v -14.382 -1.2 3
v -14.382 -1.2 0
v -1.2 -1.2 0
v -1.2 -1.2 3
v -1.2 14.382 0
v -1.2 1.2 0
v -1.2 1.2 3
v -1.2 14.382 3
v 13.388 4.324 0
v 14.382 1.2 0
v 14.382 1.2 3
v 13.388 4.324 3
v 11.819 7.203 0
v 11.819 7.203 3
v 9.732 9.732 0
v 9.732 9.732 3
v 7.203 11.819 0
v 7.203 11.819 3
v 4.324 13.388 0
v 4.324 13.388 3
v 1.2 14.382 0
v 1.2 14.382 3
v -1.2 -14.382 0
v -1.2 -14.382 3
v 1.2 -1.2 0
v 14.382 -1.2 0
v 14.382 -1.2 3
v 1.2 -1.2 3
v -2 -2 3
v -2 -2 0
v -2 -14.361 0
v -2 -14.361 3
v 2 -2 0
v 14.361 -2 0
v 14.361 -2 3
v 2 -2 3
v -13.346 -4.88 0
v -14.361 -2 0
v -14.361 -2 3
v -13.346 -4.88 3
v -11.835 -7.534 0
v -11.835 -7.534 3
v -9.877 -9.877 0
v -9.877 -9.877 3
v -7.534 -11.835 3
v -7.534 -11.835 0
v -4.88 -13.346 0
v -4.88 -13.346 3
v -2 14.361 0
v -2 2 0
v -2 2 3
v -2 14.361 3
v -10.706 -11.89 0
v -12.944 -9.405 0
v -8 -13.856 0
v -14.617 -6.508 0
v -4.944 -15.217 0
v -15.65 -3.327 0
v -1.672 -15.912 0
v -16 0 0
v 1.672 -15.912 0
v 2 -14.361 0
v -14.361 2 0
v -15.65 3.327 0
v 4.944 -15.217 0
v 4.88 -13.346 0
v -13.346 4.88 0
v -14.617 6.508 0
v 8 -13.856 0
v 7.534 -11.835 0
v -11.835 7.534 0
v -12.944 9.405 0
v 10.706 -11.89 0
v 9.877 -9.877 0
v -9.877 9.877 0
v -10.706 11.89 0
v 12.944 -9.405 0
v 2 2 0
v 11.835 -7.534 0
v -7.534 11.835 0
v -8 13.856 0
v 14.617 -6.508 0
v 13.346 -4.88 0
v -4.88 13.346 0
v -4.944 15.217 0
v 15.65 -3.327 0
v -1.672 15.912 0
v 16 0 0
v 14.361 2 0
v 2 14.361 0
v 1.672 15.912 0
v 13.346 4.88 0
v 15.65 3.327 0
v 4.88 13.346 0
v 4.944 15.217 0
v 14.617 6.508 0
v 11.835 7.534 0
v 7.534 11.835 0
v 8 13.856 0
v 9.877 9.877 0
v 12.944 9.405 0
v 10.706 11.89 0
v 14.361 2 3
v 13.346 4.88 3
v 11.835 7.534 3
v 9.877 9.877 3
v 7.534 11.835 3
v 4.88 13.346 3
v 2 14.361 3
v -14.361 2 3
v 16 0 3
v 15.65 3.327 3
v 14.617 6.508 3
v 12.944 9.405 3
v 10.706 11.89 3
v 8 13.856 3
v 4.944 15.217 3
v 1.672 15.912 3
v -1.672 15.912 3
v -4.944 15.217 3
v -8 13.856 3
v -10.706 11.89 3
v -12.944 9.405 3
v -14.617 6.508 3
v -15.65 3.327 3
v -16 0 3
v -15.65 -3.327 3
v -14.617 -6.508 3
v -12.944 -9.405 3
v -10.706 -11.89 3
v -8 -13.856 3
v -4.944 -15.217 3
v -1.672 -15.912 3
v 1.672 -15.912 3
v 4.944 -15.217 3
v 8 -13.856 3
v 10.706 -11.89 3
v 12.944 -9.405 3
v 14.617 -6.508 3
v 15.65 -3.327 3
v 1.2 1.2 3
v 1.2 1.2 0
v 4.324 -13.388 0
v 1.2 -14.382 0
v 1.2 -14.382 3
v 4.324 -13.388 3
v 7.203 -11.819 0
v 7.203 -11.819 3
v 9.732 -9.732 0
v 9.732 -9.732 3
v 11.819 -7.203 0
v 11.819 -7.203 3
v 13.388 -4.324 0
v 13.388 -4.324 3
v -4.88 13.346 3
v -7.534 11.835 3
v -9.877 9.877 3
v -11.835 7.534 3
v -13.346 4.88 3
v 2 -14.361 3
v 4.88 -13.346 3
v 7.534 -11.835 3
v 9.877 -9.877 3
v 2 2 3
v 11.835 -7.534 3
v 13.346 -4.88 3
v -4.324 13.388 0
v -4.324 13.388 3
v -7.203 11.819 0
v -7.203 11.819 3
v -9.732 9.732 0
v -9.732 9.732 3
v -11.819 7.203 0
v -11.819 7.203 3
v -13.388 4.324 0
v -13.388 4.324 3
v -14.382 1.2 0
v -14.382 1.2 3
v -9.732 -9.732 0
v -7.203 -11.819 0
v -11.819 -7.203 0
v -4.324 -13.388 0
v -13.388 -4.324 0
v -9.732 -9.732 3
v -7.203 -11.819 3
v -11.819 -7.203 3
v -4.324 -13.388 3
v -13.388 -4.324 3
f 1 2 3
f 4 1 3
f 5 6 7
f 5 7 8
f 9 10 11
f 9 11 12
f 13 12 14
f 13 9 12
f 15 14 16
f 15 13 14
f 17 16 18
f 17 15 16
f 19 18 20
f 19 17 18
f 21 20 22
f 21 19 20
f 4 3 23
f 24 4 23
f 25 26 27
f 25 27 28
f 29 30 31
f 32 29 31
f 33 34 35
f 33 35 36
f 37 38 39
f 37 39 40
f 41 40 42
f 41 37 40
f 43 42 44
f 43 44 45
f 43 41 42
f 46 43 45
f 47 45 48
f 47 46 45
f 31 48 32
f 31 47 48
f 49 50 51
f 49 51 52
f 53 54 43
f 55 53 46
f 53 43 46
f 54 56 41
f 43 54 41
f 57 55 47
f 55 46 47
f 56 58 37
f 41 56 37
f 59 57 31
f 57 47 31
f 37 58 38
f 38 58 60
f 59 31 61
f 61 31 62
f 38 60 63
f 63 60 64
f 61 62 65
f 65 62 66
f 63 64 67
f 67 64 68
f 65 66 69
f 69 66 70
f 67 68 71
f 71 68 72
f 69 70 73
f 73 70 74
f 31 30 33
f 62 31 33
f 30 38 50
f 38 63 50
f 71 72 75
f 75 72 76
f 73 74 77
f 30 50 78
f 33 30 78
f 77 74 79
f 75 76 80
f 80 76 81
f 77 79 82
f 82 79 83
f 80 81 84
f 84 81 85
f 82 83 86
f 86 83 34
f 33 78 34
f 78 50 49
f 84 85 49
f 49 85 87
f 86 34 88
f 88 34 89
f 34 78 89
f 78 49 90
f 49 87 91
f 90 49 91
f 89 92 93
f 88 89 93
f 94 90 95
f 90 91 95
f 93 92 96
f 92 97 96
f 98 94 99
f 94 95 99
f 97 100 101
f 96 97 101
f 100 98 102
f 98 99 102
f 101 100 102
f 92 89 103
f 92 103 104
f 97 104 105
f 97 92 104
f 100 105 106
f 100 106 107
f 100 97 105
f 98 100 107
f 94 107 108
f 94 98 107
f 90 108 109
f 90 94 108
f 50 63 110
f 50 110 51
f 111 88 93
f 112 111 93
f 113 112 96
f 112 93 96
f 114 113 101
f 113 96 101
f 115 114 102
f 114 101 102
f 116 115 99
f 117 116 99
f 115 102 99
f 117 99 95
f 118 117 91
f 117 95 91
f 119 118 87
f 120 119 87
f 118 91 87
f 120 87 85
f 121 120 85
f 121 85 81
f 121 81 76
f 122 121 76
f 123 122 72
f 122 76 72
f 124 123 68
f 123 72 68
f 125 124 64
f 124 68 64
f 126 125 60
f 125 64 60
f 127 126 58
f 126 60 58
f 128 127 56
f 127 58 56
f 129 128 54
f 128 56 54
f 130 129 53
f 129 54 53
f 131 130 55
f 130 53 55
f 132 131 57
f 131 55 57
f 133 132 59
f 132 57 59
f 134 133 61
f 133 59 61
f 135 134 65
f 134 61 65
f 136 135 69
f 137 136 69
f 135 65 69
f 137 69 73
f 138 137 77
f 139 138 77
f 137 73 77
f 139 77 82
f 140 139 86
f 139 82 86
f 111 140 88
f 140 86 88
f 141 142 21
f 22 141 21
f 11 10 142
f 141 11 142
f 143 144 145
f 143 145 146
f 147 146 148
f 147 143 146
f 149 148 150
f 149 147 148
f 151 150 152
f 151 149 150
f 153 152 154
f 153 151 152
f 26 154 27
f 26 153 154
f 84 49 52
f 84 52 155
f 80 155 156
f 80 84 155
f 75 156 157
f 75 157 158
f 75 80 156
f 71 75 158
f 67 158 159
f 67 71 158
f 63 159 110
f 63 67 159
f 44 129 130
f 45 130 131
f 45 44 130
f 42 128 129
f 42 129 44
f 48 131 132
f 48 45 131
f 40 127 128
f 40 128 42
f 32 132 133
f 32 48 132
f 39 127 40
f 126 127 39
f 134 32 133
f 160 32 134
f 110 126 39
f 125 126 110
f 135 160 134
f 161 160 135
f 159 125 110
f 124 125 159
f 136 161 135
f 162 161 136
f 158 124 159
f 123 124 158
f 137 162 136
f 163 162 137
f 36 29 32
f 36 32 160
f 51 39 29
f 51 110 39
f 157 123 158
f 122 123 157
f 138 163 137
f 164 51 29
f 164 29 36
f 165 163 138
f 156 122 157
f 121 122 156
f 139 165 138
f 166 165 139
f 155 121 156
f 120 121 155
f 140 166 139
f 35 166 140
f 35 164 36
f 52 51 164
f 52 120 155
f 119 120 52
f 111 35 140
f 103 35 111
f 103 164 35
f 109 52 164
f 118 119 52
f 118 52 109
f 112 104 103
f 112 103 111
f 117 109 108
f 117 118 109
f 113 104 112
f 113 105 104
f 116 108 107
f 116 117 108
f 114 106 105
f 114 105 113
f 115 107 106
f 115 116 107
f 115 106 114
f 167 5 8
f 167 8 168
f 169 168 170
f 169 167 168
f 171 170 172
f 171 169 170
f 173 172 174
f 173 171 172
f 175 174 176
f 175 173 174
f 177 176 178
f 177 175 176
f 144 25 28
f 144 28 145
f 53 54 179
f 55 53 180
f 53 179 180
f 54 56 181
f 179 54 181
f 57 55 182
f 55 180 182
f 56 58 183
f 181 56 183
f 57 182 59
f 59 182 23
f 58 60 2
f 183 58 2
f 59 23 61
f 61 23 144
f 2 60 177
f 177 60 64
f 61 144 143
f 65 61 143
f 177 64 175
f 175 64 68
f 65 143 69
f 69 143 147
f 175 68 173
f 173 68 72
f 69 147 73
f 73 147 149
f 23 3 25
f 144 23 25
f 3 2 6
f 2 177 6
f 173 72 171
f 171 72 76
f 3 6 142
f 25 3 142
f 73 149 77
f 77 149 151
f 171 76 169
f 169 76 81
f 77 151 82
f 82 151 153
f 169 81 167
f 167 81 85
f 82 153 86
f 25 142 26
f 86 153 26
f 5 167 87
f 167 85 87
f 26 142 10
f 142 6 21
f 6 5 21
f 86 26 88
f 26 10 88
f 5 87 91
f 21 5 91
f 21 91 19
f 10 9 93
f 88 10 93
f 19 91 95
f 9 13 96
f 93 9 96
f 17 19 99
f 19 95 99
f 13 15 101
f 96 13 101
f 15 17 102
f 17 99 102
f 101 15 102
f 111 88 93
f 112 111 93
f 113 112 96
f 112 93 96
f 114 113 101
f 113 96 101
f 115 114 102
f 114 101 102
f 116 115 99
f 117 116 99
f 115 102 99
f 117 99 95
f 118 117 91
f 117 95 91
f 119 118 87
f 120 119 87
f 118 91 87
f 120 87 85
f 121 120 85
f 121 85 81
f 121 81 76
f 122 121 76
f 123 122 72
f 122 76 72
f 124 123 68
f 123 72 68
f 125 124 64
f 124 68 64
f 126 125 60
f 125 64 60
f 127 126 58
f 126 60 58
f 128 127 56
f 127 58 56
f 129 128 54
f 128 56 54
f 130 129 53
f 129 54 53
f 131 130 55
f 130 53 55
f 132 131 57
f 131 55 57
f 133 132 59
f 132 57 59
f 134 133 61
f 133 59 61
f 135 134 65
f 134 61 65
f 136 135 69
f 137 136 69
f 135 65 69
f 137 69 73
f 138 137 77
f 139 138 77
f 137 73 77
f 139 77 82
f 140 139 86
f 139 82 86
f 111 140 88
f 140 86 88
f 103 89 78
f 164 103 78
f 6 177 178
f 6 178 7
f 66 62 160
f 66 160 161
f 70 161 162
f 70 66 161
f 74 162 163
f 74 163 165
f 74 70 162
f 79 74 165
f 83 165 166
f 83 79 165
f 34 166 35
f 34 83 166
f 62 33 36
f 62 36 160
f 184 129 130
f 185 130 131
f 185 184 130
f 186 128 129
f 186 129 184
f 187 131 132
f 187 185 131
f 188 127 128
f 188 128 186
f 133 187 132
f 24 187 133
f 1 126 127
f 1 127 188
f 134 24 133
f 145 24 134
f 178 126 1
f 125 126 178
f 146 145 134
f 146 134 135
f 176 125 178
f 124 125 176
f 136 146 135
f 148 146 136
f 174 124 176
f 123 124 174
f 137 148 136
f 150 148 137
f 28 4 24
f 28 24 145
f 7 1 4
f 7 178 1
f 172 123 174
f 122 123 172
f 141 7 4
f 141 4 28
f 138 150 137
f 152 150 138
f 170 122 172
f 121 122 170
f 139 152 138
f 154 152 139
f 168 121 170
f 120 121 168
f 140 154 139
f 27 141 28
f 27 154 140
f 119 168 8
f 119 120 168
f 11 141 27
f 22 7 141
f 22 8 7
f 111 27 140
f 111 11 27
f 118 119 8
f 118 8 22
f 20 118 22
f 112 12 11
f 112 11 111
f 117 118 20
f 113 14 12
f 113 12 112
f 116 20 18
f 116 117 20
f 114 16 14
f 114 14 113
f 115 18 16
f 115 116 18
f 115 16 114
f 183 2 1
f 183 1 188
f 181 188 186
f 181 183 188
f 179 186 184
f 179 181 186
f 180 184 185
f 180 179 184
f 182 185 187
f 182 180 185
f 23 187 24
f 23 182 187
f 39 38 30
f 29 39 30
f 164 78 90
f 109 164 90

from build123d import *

# Parameters (mm, degrees)
SKETCH_R     = 16
PAD_DEPTH    = 3
SKETCH001_R  = 16
PAD001_DEPTH = 3


with BuildPart() as body:
    # Sketch (on XY_Plane of Origin) → Pad (new body)
    with BuildSketch(Plane.XY):
        Circle(SKETCH_R)
        with BuildLine():
            Line((-14.3611, 2), (-2, 2))
            Line((-2, 2), (-2, 14.3611))
            ThreePointArc((-2, 14.3611), (-9.876731, 9.876731), (-14.3611, 2))
        make_face(mode=Mode.SUBTRACT)
        with BuildLine():
            Line((2, 2), (2, 14.3611))
            ThreePointArc((14.3611, 2), (9.876731, 9.876731), (2, 14.3611))
            Line((14.3611, 2), (2, 2))
        make_face(mode=Mode.SUBTRACT)
        with BuildLine():
            ThreePointArc((-14.3611, -2), (-9.876731, -9.876731), (-2, -14.3611))
            Line((-2, -2), (-2, -14.3611))
            Line((-14.3611, -2), (-2, -2))
        make_face(mode=Mode.SUBTRACT)
        with BuildLine():
            Line((2, -2), (2, -14.3611))
            ThreePointArc((2, -14.3611), (9.876731, -9.876731), (14.3611, -2))
            Line((14.3611, -2), (2, -2))
        make_face(mode=Mode.SUBTRACT)
    extrude(amount=PAD_DEPTH)


with BuildPart() as body001:
    # Sketch001 (on XY_Plane of Origin002) → Pad001 (new body)
    with BuildSketch(Plane.XY):
        Circle(SKETCH001_R)
        with BuildLine():
            Line((-14.3821, 1.2), (-1.2, 1.2))
            Line((-1.2, 1.2), (-1.2, 14.3821))
            ThreePointArc((-1.2, 14.3821), (-9.731981, 9.731981), (-14.3821, 1.2))
        make_face(mode=Mode.SUBTRACT)
        with BuildLine():
            Line((1.2, 1.2), (1.2, 14.3821))
            ThreePointArc((14.3821, 1.2), (9.731981, 9.731981), (1.2, 14.3821))
            Line((14.3821, 1.2), (1.2, 1.2))
        make_face(mode=Mode.SUBTRACT)
        with BuildLine():
            ThreePointArc((-14.3821, -1.2), (-9.731981, -9.731981), (-1.2, -14.3821))
            Line((-1.2, -1.2), (-1.2, -14.3821))
            Line((-14.3821, -1.2), (-1.2, -1.2))
        make_face(mode=Mode.SUBTRACT)
        with BuildLine():
            Line((1.2, -1.2), (1.2, -14.3821))
            ThreePointArc((1.2, -14.3821), (9.731981, -9.731981), (14.3821, -1.2))
            Line((14.3821, -1.2), (1.2, -1.2))
        make_face(mode=Mode.SUBTRACT)
    extrude(amount=PAD001_DEPTH)


solid = Compound([body.part, body001.part])
